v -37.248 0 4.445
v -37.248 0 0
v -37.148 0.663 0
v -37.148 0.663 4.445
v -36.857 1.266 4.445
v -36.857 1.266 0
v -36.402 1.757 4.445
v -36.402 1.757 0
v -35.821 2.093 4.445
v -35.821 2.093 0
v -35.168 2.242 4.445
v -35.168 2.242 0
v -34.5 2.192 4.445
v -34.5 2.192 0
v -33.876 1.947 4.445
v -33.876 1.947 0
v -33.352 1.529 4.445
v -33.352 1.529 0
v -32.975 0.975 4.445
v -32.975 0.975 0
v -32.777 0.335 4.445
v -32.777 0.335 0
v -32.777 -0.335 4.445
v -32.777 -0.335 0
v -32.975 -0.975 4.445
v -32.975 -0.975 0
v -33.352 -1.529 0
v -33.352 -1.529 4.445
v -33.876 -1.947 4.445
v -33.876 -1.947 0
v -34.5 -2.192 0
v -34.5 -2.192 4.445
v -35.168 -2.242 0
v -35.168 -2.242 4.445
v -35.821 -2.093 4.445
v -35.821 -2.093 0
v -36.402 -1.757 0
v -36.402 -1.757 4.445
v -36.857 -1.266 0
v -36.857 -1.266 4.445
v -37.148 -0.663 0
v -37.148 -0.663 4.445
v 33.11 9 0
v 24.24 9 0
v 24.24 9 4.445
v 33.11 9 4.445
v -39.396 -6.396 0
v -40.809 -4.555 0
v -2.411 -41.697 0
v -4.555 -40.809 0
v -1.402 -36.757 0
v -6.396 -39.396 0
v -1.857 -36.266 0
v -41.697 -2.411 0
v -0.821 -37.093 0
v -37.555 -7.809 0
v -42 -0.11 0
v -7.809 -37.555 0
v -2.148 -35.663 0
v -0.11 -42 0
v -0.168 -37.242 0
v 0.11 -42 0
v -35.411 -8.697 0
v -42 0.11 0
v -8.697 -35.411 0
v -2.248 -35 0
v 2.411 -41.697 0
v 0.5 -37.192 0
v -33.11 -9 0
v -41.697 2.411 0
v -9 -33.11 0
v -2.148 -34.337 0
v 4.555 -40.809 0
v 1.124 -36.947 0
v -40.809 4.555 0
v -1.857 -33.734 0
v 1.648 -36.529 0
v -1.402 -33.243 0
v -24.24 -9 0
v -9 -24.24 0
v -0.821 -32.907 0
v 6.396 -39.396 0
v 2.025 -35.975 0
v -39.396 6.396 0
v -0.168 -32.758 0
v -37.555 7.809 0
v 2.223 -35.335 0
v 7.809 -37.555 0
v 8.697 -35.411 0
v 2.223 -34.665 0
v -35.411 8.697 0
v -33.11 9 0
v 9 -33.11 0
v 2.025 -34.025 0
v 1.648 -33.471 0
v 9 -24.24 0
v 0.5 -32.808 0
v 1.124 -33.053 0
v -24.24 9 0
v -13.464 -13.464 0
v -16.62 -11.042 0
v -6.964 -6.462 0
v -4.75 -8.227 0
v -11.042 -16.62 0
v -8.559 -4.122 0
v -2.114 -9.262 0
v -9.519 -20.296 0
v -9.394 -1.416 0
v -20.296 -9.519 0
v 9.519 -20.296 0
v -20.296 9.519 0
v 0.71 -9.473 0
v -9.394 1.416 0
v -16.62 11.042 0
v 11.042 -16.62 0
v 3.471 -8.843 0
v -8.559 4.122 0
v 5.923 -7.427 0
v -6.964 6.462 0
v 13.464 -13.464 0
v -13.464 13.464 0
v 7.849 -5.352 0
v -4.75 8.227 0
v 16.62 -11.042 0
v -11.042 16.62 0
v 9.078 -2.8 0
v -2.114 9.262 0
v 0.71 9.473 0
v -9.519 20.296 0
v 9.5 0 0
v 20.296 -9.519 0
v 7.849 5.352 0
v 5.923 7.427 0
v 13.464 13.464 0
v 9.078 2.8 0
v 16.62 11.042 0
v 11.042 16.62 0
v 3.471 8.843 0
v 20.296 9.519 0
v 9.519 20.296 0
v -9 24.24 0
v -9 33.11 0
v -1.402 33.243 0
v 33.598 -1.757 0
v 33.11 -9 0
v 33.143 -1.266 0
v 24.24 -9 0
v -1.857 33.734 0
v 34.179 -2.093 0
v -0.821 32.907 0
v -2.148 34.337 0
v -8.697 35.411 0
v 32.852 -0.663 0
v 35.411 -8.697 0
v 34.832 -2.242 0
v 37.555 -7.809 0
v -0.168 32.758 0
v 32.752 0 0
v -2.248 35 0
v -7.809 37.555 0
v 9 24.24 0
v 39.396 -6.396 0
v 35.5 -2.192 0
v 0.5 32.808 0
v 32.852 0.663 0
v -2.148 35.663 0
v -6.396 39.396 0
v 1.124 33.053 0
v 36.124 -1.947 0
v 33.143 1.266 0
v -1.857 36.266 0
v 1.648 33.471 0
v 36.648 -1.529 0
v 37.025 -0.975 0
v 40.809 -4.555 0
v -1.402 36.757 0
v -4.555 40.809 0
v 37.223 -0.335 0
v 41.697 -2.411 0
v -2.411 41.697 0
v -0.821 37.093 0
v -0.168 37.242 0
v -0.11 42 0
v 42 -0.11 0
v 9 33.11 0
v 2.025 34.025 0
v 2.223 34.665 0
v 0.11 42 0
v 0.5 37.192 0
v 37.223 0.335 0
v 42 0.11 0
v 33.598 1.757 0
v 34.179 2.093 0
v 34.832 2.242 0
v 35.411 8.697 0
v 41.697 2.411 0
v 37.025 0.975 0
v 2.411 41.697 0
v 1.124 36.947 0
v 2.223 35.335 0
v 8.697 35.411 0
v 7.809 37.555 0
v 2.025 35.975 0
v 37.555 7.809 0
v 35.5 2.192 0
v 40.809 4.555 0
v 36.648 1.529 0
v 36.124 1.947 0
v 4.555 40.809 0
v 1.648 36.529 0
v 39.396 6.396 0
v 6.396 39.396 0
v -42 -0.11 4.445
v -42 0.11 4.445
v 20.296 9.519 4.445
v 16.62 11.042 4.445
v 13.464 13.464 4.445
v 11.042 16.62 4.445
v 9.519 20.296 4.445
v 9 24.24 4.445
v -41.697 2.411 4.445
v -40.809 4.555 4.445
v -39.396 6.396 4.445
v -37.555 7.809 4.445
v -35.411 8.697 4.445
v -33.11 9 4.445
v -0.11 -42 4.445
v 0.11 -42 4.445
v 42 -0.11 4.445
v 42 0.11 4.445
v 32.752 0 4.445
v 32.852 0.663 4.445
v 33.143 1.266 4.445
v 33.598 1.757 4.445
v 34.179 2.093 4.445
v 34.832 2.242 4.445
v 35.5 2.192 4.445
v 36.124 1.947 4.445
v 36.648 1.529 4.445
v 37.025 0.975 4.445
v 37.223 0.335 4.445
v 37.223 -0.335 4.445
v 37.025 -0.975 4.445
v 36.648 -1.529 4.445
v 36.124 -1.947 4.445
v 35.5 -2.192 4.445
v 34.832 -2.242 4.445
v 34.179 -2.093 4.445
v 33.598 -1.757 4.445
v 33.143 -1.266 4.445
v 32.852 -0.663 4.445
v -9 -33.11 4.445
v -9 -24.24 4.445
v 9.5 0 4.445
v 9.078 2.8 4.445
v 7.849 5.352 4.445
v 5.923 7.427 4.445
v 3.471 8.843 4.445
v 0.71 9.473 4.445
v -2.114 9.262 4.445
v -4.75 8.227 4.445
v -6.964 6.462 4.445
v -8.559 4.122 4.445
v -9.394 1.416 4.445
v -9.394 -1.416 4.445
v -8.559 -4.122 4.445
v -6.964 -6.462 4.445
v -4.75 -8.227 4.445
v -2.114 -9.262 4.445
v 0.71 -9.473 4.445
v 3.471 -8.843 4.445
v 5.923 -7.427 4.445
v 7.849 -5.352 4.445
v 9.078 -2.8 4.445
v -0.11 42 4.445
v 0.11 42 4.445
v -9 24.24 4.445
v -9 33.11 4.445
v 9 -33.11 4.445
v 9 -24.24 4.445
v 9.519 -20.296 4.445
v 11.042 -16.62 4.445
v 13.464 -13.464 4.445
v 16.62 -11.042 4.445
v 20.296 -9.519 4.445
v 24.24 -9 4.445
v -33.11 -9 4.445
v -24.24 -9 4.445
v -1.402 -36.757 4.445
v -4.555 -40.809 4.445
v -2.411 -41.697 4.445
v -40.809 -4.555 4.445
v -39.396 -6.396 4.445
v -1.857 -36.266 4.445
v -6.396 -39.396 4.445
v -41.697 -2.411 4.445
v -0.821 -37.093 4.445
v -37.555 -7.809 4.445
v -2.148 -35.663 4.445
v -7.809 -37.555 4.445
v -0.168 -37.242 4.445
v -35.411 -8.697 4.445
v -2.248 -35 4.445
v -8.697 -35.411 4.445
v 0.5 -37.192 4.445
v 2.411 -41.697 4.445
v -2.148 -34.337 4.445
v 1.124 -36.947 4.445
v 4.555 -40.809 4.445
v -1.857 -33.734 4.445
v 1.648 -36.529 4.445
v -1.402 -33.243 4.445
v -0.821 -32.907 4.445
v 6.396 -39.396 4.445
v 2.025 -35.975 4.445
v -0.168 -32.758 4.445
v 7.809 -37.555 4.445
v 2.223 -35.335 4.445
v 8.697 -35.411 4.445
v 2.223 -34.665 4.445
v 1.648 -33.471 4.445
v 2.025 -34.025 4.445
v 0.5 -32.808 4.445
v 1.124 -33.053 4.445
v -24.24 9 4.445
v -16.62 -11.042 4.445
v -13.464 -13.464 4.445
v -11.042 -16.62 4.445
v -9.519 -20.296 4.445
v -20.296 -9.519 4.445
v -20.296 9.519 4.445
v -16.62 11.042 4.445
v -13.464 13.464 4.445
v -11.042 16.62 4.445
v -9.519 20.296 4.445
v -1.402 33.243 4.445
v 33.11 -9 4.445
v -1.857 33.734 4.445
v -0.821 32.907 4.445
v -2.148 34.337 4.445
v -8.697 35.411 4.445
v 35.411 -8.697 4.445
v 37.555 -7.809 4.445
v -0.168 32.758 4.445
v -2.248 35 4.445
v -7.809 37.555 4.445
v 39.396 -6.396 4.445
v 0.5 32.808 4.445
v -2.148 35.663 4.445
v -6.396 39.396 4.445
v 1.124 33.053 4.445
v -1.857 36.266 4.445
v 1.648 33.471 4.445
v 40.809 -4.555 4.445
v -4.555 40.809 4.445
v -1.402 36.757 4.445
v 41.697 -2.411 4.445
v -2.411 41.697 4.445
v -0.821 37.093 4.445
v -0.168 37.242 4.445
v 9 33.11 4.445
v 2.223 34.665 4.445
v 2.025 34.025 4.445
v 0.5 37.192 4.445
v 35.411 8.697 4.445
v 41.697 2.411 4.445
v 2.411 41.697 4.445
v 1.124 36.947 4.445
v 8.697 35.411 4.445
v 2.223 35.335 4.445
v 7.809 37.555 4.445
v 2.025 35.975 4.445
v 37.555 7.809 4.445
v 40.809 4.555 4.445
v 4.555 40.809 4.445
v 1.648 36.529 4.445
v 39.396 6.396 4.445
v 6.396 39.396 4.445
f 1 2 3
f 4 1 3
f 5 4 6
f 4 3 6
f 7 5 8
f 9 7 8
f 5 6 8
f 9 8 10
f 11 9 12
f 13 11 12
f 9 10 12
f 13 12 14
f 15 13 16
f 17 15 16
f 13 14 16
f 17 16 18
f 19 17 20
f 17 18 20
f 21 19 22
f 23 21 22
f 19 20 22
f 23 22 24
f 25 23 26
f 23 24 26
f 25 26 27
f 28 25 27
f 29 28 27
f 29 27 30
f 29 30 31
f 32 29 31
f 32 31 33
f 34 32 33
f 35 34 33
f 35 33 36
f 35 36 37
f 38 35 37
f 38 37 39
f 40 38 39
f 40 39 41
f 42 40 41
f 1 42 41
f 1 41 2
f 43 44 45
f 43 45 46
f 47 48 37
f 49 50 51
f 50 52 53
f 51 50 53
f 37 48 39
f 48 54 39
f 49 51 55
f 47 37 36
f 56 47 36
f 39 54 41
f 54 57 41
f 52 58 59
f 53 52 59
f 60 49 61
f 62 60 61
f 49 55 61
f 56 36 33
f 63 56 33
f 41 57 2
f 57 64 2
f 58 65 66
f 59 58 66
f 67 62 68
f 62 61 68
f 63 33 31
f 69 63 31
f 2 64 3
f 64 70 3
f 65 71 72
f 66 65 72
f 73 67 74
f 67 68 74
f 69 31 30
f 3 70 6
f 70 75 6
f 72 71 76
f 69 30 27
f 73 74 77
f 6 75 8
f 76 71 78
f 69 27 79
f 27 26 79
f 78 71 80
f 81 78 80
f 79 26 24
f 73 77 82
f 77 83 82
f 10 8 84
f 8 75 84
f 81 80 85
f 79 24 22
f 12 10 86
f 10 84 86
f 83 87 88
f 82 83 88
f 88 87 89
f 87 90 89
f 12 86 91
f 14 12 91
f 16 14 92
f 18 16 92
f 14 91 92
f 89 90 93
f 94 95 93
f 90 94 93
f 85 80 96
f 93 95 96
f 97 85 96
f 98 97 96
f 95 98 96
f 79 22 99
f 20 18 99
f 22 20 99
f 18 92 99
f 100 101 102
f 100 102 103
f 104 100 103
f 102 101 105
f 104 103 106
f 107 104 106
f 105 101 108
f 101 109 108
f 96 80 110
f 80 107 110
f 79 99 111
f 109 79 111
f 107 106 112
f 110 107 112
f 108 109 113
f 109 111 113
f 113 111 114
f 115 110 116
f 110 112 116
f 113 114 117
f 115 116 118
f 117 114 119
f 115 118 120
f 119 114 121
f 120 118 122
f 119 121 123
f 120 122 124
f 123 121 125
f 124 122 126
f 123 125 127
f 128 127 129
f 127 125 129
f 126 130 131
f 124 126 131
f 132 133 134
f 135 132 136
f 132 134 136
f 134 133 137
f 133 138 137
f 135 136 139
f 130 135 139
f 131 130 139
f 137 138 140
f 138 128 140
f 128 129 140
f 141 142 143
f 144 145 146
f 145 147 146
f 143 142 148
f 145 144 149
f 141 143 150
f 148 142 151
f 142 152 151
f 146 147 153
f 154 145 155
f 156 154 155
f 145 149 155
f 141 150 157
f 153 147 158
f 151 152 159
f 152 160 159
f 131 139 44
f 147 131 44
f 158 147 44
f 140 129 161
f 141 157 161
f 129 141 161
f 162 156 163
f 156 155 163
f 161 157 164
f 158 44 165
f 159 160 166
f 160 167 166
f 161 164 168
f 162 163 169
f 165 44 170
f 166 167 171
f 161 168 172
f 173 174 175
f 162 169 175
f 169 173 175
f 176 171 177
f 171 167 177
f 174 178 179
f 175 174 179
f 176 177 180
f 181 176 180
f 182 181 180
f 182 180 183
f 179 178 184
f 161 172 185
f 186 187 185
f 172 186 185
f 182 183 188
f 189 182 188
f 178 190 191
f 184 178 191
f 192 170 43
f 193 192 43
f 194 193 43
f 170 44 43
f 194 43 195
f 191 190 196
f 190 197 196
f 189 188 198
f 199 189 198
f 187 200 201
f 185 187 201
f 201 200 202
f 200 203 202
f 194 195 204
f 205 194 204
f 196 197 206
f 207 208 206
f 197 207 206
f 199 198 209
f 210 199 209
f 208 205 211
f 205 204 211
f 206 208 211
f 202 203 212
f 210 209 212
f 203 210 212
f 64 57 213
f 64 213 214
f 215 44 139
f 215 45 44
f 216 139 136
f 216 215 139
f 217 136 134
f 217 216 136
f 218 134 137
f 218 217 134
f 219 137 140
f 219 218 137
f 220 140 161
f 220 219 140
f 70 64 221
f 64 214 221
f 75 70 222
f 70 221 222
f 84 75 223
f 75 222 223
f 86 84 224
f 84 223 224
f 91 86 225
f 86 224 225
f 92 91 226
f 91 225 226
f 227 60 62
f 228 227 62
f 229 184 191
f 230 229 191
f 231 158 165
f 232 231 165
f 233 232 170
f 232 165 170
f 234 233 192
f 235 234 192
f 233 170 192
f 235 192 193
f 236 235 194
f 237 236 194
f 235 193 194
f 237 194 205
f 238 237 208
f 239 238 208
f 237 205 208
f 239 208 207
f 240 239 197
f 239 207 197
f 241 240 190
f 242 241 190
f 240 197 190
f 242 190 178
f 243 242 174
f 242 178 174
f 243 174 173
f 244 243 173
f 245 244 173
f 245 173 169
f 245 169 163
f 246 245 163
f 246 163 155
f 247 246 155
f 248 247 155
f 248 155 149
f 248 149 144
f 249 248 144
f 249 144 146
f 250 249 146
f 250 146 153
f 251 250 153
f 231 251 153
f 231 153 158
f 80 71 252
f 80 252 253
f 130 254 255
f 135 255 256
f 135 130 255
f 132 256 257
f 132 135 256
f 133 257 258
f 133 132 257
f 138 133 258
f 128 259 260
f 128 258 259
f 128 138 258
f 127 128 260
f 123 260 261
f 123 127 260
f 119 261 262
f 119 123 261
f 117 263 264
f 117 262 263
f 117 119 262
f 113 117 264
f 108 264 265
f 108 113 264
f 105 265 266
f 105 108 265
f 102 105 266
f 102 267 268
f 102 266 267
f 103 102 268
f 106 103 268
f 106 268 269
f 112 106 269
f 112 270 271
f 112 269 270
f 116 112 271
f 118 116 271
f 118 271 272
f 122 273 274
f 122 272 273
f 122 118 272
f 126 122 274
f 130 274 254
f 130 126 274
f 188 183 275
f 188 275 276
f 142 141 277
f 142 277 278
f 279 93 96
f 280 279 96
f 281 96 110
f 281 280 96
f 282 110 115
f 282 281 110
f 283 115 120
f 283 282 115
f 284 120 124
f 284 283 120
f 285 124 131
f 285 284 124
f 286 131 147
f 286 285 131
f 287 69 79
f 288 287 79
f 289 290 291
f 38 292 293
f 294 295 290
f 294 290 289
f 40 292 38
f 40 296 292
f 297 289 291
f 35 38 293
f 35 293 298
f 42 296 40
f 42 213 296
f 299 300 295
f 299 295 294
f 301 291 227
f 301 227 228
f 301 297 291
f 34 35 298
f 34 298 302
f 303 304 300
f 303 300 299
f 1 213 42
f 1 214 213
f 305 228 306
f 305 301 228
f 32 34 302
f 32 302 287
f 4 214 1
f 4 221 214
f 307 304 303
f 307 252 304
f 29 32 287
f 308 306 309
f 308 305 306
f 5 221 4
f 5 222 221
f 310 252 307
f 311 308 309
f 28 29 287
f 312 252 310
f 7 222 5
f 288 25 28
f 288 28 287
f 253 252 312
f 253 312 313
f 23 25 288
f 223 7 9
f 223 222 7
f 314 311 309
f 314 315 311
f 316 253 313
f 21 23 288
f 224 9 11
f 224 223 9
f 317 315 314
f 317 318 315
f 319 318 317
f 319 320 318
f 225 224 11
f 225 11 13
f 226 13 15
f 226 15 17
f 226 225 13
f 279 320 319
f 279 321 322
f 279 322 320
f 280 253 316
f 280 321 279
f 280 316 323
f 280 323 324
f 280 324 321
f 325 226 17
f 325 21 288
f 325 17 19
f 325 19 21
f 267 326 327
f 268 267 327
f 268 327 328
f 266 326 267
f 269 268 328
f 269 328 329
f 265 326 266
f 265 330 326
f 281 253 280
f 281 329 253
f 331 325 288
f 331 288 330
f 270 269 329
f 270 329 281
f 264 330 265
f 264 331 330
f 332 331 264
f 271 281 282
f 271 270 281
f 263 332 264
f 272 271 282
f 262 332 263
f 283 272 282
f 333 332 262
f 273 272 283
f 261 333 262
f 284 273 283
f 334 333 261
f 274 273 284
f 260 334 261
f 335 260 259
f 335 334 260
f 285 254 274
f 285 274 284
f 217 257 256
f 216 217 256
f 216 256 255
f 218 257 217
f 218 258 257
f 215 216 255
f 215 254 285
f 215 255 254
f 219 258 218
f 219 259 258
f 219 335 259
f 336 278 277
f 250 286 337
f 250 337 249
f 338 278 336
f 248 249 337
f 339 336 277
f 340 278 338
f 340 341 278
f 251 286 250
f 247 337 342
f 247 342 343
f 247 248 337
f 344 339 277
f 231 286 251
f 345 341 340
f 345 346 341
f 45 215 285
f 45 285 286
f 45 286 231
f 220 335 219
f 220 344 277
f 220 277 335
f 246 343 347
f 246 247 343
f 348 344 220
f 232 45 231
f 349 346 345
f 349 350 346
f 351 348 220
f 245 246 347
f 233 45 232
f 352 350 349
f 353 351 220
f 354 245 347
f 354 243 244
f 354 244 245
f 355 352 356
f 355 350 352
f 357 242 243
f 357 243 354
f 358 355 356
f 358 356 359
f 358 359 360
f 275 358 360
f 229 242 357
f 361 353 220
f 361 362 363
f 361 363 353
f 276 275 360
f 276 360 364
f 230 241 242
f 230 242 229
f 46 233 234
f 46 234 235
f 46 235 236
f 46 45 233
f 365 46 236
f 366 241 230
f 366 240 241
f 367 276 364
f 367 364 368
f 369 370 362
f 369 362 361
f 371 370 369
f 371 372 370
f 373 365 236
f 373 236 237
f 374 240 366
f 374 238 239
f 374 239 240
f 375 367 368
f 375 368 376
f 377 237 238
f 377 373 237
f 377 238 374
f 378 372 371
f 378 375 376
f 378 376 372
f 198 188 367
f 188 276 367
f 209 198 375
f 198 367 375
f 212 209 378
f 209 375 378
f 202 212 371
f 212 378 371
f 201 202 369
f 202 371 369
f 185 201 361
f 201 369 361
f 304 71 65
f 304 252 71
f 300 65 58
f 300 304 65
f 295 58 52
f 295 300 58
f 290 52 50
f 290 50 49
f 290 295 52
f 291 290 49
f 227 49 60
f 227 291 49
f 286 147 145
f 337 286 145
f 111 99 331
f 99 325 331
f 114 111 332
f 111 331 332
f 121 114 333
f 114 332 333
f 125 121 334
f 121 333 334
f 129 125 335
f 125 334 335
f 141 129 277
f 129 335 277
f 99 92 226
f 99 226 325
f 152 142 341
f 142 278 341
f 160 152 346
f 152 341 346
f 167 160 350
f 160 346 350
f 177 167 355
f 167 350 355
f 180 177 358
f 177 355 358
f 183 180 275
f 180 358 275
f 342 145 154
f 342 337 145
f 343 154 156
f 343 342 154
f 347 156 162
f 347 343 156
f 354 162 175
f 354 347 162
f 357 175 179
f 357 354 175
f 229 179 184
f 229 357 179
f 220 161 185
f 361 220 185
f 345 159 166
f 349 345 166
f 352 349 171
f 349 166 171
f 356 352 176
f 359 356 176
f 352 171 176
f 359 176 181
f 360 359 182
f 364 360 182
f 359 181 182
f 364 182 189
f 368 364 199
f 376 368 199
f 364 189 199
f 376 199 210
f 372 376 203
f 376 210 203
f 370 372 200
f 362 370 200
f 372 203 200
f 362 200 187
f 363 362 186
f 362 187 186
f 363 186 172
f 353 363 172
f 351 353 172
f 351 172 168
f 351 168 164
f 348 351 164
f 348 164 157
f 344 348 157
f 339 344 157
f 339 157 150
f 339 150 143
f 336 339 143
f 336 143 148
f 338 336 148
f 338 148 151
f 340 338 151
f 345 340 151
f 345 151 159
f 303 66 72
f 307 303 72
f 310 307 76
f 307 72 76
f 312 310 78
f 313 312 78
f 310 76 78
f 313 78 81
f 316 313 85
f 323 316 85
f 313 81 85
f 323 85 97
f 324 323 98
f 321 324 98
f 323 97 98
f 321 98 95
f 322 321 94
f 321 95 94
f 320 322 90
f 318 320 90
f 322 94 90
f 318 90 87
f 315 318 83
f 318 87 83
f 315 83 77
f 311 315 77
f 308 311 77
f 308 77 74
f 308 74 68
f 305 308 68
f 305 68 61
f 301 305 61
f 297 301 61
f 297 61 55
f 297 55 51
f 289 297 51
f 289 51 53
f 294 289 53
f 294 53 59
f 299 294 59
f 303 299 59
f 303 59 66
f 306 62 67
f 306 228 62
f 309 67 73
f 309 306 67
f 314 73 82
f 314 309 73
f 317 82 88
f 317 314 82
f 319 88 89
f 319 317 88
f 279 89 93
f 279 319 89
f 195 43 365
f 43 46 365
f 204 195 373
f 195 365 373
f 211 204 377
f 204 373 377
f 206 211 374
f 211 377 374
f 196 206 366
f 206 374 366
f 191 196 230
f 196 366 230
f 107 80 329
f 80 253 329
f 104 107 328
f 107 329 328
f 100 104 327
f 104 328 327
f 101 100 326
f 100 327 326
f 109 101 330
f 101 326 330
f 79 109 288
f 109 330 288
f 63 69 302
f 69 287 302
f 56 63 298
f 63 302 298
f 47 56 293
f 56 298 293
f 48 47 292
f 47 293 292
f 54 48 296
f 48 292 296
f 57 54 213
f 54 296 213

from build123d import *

# Parameters (mm, degrees)
F0_W     = 84
F0_H     = 18
F1_DEPTH = 4.445
F2_W     = 18
F2_H     = 84
F3_DEPTH = 4.445
F4_R     = 8.89
F6_D     = 4.4958
F7_R     = 9.5
F8_DEPTH = 4.446
F9_R     = 15.24


with BuildPart() as f1:
    # F0 (on Top) → F1 (new body)
    with BuildSketch(Plane.XY):
        Rectangle(F0_W, F0_H)
    extrude(amount=F1_DEPTH)

    # F2 (on Top) → F3 (join, through all)
    with BuildSketch(Plane.XY):
        Rectangle(F2_W, F2_H)
    extrude(amount=F3_DEPTH)

    # F4
    f4_edges = [f1.edges().sort_by_distance(p)[0] for p in [
        (9, -42, 2.2225),
        (-9, -42, 2.2225),
        (42, -9, 2.2225),
        (42, 9, 2.2225),
        (9, 42, 2.2225),
        (-42, -9, 2.2225),
        (-42, 9, 2.2225),
        (-9, 42, 2.2225),
    ]]
    fillet(f4_edges, radius=F4_R)

    # F6 (through all)
    with Locations(Plane.XY.offset(4.445)):
        with Locations((35, 0), (0, -35), (-35, 0), (0, 35)):
            Hole(F6_D / 2)

    # F7 (on Top) → F8 (cut, through all)
    with BuildSketch(Plane.XY):
        Circle(F7_R)
    extrude(amount=F8_DEPTH, mode=Mode.SUBTRACT)

    # F9
    f9_edges = [f1.edges().sort_by_distance(p)[0] for p in [
        (9, 9, 2.2225),
        (9, -9, 2.2225),
        (-9, -9, 2.2225),
        (-9, 9, 2.2225),
    ]]
    fillet(f9_edges, radius=F9_R)


solid = f1.part
